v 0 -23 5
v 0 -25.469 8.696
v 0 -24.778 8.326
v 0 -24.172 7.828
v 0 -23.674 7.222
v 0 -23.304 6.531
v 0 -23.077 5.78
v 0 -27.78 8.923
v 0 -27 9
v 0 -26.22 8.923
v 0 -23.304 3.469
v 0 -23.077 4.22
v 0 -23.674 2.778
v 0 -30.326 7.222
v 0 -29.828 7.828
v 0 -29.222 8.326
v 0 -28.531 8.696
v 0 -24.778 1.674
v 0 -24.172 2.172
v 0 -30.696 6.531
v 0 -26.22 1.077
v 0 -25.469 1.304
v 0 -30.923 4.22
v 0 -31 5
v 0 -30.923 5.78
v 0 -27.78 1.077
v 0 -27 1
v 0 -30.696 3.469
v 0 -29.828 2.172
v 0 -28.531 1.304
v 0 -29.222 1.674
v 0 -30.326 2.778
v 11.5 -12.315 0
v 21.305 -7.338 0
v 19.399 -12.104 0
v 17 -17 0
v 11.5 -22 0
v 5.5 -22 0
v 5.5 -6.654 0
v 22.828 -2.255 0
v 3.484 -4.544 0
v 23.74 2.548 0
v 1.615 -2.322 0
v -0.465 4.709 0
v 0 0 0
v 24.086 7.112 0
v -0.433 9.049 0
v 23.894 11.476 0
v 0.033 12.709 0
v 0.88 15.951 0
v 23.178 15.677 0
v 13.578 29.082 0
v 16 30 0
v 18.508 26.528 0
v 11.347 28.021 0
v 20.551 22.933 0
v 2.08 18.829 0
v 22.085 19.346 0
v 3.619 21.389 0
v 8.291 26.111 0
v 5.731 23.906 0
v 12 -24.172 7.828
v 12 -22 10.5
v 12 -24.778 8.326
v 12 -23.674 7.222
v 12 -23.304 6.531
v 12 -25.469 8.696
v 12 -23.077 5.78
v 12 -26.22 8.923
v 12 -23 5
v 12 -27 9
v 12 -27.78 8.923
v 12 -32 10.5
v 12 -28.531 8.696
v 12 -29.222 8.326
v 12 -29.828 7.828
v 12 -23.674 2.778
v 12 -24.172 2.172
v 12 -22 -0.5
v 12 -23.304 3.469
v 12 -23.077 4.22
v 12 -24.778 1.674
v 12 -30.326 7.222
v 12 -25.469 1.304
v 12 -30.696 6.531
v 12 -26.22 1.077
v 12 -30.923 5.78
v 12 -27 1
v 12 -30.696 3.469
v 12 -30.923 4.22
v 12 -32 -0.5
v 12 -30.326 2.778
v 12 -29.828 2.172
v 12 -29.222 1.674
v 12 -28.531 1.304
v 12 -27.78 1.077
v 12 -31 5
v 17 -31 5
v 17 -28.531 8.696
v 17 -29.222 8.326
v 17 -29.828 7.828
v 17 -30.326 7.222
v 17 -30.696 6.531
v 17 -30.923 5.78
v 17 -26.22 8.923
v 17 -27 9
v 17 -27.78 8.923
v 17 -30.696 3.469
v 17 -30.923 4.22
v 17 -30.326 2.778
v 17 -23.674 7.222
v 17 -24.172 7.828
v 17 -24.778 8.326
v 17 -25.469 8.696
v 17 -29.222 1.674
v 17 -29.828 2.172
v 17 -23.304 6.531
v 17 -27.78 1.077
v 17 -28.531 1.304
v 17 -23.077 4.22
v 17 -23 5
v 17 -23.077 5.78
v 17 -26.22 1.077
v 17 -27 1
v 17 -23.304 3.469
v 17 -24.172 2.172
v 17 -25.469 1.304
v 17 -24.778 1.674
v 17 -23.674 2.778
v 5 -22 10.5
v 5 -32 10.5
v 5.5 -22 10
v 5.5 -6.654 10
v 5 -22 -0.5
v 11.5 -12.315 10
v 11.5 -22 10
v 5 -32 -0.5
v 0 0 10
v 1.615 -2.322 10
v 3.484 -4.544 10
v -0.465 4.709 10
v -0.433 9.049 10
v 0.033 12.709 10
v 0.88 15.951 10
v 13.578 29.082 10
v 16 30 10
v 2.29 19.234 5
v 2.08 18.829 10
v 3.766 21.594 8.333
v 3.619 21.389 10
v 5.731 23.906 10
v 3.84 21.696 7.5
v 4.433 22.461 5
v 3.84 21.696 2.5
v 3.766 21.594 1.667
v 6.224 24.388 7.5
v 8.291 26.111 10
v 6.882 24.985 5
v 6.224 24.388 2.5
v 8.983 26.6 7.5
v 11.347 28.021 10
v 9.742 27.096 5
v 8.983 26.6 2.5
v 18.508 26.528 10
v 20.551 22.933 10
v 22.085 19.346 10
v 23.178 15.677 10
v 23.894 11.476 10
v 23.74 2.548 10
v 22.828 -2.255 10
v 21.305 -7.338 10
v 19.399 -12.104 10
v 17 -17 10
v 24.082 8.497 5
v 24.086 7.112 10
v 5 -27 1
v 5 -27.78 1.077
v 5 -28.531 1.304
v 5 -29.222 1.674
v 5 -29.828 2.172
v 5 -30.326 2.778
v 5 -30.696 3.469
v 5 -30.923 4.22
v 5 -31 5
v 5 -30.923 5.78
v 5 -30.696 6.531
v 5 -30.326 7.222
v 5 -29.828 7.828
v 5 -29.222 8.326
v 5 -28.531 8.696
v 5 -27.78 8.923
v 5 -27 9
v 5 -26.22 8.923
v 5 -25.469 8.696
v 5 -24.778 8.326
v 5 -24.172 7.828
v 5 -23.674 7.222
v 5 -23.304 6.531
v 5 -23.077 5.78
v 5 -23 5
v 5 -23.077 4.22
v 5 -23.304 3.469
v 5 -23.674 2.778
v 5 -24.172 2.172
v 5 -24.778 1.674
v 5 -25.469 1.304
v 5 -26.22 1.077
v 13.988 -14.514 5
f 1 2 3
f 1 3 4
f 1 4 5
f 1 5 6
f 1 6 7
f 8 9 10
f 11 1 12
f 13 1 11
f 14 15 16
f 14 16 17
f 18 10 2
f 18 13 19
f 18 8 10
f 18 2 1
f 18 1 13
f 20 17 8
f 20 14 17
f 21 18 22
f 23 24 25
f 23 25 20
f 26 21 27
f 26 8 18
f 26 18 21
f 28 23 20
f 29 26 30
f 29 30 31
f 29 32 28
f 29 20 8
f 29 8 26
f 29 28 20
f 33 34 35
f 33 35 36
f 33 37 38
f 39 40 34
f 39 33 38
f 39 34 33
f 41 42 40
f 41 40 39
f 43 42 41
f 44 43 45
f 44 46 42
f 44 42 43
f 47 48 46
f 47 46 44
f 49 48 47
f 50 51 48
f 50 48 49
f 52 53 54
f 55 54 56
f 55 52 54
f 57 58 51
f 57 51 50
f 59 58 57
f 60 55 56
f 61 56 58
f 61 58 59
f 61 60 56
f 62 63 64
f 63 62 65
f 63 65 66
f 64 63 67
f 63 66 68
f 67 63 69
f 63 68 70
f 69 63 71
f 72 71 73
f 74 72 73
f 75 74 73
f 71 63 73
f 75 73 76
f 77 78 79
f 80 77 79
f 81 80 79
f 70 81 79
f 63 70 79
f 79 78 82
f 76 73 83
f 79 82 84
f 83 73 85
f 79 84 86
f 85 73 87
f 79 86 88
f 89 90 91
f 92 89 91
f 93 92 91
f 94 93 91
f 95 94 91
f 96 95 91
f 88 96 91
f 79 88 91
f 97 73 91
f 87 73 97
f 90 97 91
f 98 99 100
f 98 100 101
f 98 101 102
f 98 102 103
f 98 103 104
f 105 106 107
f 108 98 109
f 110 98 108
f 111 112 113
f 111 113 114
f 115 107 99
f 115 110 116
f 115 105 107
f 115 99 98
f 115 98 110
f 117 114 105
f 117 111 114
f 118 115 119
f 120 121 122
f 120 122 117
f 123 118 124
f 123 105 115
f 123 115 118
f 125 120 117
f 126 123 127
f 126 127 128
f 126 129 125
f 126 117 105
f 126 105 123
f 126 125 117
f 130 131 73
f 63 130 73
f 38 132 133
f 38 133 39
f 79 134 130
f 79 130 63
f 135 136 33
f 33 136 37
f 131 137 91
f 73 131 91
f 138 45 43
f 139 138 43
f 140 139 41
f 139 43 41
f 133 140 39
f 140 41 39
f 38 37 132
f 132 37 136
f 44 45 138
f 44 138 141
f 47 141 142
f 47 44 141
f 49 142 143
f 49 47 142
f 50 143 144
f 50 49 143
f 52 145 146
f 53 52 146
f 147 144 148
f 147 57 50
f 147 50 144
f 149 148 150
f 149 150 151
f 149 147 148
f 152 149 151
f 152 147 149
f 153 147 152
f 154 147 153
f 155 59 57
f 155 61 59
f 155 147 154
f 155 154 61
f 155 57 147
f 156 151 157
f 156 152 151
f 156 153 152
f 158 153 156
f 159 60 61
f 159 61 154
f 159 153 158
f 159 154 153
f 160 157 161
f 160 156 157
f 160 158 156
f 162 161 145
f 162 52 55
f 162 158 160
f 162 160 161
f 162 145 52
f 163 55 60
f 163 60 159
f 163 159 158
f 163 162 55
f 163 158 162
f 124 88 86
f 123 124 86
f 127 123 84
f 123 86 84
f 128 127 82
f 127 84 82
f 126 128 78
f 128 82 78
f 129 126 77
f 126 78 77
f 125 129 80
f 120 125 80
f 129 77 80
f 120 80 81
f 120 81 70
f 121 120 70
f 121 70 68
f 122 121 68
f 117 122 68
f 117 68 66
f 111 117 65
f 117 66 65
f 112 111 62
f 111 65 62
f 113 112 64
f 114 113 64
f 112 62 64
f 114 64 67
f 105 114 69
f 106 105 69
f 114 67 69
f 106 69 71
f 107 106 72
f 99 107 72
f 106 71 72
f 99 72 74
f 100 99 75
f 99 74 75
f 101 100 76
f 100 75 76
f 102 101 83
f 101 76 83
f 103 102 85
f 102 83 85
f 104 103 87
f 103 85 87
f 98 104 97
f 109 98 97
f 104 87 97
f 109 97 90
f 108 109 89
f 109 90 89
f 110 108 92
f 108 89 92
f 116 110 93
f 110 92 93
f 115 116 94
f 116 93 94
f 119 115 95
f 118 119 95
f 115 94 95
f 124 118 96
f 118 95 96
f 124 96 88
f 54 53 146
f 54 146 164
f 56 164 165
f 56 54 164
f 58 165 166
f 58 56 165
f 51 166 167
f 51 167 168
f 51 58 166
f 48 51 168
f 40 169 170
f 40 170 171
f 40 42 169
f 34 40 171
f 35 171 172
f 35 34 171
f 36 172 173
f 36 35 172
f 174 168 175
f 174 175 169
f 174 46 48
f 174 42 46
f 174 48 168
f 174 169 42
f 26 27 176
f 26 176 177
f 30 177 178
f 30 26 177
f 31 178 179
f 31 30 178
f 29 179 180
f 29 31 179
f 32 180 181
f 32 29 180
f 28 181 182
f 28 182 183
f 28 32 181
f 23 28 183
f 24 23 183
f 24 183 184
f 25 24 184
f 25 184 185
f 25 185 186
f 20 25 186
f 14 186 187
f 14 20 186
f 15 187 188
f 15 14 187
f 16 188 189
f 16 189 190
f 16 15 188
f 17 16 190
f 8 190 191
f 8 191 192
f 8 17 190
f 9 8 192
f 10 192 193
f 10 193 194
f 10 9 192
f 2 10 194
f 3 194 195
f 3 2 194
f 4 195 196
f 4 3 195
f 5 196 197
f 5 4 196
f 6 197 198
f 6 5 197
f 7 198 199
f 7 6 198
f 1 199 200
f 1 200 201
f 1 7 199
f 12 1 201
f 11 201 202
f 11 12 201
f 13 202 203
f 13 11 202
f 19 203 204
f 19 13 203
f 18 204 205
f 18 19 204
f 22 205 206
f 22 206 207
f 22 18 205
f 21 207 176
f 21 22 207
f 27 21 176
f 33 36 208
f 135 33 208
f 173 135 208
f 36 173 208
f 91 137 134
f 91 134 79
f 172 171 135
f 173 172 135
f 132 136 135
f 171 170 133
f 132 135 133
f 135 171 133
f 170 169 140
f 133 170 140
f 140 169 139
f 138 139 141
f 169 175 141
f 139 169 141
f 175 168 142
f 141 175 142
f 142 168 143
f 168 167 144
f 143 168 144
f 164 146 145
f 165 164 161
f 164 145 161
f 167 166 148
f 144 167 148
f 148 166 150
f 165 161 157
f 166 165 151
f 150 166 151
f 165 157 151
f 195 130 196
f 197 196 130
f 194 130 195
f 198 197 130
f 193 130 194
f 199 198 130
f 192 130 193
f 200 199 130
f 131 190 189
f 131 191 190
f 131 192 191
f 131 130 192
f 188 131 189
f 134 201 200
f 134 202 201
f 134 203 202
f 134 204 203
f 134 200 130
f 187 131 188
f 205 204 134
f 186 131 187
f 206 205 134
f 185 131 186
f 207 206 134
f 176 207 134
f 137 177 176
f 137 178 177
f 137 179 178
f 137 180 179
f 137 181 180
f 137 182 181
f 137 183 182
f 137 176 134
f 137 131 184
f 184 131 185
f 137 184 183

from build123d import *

# Parameters (mm, degrees)
BOSS_EXTRUDE1_DEPTH = 10
BOSS_EXTRUDE3_REACH = 69.263
SKETCH5_W           = 6
SKETCH5_H           = 10
SKETCH6_W           = 6.999999994
SKETCH6_H           = 11
BOSS_EXTRUDE4_DEPTH = 10
SKETCH7_R           = 4
BOSS_EXTRUDE5_DEPTH = 5
BOSS_EXTRUDE6_START = 5
SKETCH8_R           = 4
BOSS_EXTRUDE6_DEPTH = 5


with BuildPart() as part:
    # Sketch1 → Boss-Extrude1 (new body)
    with BuildSketch(Plane.XY):
        with BuildLine():
            add(Edge.make_bspline(
                [(0, 0), (-3.419610413, 23.467889897), (16, 30)],
                knots=[0, 0, 0, 1, 1, 1], degree=2))
            add(Edge.make_bspline(
                [(16, 30), (31.664871657, 10.493306503), (17, -17)],
                knots=[0, 0, 0, 1, 1, 1], degree=2))
            add(Edge.make_bspline(
                [(0, 0), (2.284131215, -3.729797084), (8.779561726, -9.792489567), (13.520650698, -14.223340653), (17, -17)],
                knots=[0, 0, 0, 0, 0.559197284, 1, 1, 1, 1], degree=3))
        make_face()
    extrude(amount=BOSS_EXTRUDE1_DEPTH)

    # Sketch5 → Boss-Extrude3 (add, up to next)
    with BuildSketch(Plane(origin=(0, -32, 0), x_dir=(1, 0, 0), z_dir=(0, 1, 0)), mode=Mode.PRIVATE) as boss_extrude3_sk1:
        with Locations((8.5, -5)):
            Rectangle(SKETCH5_W, SKETCH5_H)
    boss_extrude3_tool1 = extrude(boss_extrude3_sk1.sketch, amount=BOSS_EXTRUDE3_REACH, mode=Mode.PRIVATE) - part.part
    add(boss_extrude3_tool1.solids().sort_by_distance((8.5, -32, 5))[0])

    # Sketch6 → Boss-Extrude4 (add)
    with BuildSketch(Plane(origin=(0, -32, 0), x_dir=(1, 0, 0), z_dir=(0, 1, 0))):
        with Locations((8.499999997, -5)):
            Rectangle(SKETCH6_W, SKETCH6_H)
    extrude(amount=BOSS_EXTRUDE4_DEPTH)

    # Sketch7 → Boss-Extrude5 (add)
    with BuildSketch(Plane(origin=(11.999999994, 0, 0), x_dir=(0, 0, -1), z_dir=(1, 0, 0))):
        with Locations((-5, -27)):
            Circle(SKETCH7_R)
    extrude(amount=BOSS_EXTRUDE5_DEPTH)

    # Sketch8 → Boss-Extrude6 (add)
    with BuildSketch(Plane.ZY.offset(-5).offset(BOSS_EXTRUDE6_START)):
        with Locations(Location((5, -27, 0), (0, 0, 180))):
            Circle(SKETCH8_R)
    extrude(amount=-BOSS_EXTRUDE6_DEPTH)


with BuildPart() as body_2:
    # Split1: the piece on the far side of the plane
    add(part.part)
    split(bisect_by=Plane.ZX.offset(-22), keep=Keep.BOTTOM)


with BuildPart() as part_1:
    add(part.part)

    # Split1
    split(bisect_by=Plane.ZX.offset(-22), keep=Keep.TOP)


solid = Compound([body_2.part, part_1.part])
